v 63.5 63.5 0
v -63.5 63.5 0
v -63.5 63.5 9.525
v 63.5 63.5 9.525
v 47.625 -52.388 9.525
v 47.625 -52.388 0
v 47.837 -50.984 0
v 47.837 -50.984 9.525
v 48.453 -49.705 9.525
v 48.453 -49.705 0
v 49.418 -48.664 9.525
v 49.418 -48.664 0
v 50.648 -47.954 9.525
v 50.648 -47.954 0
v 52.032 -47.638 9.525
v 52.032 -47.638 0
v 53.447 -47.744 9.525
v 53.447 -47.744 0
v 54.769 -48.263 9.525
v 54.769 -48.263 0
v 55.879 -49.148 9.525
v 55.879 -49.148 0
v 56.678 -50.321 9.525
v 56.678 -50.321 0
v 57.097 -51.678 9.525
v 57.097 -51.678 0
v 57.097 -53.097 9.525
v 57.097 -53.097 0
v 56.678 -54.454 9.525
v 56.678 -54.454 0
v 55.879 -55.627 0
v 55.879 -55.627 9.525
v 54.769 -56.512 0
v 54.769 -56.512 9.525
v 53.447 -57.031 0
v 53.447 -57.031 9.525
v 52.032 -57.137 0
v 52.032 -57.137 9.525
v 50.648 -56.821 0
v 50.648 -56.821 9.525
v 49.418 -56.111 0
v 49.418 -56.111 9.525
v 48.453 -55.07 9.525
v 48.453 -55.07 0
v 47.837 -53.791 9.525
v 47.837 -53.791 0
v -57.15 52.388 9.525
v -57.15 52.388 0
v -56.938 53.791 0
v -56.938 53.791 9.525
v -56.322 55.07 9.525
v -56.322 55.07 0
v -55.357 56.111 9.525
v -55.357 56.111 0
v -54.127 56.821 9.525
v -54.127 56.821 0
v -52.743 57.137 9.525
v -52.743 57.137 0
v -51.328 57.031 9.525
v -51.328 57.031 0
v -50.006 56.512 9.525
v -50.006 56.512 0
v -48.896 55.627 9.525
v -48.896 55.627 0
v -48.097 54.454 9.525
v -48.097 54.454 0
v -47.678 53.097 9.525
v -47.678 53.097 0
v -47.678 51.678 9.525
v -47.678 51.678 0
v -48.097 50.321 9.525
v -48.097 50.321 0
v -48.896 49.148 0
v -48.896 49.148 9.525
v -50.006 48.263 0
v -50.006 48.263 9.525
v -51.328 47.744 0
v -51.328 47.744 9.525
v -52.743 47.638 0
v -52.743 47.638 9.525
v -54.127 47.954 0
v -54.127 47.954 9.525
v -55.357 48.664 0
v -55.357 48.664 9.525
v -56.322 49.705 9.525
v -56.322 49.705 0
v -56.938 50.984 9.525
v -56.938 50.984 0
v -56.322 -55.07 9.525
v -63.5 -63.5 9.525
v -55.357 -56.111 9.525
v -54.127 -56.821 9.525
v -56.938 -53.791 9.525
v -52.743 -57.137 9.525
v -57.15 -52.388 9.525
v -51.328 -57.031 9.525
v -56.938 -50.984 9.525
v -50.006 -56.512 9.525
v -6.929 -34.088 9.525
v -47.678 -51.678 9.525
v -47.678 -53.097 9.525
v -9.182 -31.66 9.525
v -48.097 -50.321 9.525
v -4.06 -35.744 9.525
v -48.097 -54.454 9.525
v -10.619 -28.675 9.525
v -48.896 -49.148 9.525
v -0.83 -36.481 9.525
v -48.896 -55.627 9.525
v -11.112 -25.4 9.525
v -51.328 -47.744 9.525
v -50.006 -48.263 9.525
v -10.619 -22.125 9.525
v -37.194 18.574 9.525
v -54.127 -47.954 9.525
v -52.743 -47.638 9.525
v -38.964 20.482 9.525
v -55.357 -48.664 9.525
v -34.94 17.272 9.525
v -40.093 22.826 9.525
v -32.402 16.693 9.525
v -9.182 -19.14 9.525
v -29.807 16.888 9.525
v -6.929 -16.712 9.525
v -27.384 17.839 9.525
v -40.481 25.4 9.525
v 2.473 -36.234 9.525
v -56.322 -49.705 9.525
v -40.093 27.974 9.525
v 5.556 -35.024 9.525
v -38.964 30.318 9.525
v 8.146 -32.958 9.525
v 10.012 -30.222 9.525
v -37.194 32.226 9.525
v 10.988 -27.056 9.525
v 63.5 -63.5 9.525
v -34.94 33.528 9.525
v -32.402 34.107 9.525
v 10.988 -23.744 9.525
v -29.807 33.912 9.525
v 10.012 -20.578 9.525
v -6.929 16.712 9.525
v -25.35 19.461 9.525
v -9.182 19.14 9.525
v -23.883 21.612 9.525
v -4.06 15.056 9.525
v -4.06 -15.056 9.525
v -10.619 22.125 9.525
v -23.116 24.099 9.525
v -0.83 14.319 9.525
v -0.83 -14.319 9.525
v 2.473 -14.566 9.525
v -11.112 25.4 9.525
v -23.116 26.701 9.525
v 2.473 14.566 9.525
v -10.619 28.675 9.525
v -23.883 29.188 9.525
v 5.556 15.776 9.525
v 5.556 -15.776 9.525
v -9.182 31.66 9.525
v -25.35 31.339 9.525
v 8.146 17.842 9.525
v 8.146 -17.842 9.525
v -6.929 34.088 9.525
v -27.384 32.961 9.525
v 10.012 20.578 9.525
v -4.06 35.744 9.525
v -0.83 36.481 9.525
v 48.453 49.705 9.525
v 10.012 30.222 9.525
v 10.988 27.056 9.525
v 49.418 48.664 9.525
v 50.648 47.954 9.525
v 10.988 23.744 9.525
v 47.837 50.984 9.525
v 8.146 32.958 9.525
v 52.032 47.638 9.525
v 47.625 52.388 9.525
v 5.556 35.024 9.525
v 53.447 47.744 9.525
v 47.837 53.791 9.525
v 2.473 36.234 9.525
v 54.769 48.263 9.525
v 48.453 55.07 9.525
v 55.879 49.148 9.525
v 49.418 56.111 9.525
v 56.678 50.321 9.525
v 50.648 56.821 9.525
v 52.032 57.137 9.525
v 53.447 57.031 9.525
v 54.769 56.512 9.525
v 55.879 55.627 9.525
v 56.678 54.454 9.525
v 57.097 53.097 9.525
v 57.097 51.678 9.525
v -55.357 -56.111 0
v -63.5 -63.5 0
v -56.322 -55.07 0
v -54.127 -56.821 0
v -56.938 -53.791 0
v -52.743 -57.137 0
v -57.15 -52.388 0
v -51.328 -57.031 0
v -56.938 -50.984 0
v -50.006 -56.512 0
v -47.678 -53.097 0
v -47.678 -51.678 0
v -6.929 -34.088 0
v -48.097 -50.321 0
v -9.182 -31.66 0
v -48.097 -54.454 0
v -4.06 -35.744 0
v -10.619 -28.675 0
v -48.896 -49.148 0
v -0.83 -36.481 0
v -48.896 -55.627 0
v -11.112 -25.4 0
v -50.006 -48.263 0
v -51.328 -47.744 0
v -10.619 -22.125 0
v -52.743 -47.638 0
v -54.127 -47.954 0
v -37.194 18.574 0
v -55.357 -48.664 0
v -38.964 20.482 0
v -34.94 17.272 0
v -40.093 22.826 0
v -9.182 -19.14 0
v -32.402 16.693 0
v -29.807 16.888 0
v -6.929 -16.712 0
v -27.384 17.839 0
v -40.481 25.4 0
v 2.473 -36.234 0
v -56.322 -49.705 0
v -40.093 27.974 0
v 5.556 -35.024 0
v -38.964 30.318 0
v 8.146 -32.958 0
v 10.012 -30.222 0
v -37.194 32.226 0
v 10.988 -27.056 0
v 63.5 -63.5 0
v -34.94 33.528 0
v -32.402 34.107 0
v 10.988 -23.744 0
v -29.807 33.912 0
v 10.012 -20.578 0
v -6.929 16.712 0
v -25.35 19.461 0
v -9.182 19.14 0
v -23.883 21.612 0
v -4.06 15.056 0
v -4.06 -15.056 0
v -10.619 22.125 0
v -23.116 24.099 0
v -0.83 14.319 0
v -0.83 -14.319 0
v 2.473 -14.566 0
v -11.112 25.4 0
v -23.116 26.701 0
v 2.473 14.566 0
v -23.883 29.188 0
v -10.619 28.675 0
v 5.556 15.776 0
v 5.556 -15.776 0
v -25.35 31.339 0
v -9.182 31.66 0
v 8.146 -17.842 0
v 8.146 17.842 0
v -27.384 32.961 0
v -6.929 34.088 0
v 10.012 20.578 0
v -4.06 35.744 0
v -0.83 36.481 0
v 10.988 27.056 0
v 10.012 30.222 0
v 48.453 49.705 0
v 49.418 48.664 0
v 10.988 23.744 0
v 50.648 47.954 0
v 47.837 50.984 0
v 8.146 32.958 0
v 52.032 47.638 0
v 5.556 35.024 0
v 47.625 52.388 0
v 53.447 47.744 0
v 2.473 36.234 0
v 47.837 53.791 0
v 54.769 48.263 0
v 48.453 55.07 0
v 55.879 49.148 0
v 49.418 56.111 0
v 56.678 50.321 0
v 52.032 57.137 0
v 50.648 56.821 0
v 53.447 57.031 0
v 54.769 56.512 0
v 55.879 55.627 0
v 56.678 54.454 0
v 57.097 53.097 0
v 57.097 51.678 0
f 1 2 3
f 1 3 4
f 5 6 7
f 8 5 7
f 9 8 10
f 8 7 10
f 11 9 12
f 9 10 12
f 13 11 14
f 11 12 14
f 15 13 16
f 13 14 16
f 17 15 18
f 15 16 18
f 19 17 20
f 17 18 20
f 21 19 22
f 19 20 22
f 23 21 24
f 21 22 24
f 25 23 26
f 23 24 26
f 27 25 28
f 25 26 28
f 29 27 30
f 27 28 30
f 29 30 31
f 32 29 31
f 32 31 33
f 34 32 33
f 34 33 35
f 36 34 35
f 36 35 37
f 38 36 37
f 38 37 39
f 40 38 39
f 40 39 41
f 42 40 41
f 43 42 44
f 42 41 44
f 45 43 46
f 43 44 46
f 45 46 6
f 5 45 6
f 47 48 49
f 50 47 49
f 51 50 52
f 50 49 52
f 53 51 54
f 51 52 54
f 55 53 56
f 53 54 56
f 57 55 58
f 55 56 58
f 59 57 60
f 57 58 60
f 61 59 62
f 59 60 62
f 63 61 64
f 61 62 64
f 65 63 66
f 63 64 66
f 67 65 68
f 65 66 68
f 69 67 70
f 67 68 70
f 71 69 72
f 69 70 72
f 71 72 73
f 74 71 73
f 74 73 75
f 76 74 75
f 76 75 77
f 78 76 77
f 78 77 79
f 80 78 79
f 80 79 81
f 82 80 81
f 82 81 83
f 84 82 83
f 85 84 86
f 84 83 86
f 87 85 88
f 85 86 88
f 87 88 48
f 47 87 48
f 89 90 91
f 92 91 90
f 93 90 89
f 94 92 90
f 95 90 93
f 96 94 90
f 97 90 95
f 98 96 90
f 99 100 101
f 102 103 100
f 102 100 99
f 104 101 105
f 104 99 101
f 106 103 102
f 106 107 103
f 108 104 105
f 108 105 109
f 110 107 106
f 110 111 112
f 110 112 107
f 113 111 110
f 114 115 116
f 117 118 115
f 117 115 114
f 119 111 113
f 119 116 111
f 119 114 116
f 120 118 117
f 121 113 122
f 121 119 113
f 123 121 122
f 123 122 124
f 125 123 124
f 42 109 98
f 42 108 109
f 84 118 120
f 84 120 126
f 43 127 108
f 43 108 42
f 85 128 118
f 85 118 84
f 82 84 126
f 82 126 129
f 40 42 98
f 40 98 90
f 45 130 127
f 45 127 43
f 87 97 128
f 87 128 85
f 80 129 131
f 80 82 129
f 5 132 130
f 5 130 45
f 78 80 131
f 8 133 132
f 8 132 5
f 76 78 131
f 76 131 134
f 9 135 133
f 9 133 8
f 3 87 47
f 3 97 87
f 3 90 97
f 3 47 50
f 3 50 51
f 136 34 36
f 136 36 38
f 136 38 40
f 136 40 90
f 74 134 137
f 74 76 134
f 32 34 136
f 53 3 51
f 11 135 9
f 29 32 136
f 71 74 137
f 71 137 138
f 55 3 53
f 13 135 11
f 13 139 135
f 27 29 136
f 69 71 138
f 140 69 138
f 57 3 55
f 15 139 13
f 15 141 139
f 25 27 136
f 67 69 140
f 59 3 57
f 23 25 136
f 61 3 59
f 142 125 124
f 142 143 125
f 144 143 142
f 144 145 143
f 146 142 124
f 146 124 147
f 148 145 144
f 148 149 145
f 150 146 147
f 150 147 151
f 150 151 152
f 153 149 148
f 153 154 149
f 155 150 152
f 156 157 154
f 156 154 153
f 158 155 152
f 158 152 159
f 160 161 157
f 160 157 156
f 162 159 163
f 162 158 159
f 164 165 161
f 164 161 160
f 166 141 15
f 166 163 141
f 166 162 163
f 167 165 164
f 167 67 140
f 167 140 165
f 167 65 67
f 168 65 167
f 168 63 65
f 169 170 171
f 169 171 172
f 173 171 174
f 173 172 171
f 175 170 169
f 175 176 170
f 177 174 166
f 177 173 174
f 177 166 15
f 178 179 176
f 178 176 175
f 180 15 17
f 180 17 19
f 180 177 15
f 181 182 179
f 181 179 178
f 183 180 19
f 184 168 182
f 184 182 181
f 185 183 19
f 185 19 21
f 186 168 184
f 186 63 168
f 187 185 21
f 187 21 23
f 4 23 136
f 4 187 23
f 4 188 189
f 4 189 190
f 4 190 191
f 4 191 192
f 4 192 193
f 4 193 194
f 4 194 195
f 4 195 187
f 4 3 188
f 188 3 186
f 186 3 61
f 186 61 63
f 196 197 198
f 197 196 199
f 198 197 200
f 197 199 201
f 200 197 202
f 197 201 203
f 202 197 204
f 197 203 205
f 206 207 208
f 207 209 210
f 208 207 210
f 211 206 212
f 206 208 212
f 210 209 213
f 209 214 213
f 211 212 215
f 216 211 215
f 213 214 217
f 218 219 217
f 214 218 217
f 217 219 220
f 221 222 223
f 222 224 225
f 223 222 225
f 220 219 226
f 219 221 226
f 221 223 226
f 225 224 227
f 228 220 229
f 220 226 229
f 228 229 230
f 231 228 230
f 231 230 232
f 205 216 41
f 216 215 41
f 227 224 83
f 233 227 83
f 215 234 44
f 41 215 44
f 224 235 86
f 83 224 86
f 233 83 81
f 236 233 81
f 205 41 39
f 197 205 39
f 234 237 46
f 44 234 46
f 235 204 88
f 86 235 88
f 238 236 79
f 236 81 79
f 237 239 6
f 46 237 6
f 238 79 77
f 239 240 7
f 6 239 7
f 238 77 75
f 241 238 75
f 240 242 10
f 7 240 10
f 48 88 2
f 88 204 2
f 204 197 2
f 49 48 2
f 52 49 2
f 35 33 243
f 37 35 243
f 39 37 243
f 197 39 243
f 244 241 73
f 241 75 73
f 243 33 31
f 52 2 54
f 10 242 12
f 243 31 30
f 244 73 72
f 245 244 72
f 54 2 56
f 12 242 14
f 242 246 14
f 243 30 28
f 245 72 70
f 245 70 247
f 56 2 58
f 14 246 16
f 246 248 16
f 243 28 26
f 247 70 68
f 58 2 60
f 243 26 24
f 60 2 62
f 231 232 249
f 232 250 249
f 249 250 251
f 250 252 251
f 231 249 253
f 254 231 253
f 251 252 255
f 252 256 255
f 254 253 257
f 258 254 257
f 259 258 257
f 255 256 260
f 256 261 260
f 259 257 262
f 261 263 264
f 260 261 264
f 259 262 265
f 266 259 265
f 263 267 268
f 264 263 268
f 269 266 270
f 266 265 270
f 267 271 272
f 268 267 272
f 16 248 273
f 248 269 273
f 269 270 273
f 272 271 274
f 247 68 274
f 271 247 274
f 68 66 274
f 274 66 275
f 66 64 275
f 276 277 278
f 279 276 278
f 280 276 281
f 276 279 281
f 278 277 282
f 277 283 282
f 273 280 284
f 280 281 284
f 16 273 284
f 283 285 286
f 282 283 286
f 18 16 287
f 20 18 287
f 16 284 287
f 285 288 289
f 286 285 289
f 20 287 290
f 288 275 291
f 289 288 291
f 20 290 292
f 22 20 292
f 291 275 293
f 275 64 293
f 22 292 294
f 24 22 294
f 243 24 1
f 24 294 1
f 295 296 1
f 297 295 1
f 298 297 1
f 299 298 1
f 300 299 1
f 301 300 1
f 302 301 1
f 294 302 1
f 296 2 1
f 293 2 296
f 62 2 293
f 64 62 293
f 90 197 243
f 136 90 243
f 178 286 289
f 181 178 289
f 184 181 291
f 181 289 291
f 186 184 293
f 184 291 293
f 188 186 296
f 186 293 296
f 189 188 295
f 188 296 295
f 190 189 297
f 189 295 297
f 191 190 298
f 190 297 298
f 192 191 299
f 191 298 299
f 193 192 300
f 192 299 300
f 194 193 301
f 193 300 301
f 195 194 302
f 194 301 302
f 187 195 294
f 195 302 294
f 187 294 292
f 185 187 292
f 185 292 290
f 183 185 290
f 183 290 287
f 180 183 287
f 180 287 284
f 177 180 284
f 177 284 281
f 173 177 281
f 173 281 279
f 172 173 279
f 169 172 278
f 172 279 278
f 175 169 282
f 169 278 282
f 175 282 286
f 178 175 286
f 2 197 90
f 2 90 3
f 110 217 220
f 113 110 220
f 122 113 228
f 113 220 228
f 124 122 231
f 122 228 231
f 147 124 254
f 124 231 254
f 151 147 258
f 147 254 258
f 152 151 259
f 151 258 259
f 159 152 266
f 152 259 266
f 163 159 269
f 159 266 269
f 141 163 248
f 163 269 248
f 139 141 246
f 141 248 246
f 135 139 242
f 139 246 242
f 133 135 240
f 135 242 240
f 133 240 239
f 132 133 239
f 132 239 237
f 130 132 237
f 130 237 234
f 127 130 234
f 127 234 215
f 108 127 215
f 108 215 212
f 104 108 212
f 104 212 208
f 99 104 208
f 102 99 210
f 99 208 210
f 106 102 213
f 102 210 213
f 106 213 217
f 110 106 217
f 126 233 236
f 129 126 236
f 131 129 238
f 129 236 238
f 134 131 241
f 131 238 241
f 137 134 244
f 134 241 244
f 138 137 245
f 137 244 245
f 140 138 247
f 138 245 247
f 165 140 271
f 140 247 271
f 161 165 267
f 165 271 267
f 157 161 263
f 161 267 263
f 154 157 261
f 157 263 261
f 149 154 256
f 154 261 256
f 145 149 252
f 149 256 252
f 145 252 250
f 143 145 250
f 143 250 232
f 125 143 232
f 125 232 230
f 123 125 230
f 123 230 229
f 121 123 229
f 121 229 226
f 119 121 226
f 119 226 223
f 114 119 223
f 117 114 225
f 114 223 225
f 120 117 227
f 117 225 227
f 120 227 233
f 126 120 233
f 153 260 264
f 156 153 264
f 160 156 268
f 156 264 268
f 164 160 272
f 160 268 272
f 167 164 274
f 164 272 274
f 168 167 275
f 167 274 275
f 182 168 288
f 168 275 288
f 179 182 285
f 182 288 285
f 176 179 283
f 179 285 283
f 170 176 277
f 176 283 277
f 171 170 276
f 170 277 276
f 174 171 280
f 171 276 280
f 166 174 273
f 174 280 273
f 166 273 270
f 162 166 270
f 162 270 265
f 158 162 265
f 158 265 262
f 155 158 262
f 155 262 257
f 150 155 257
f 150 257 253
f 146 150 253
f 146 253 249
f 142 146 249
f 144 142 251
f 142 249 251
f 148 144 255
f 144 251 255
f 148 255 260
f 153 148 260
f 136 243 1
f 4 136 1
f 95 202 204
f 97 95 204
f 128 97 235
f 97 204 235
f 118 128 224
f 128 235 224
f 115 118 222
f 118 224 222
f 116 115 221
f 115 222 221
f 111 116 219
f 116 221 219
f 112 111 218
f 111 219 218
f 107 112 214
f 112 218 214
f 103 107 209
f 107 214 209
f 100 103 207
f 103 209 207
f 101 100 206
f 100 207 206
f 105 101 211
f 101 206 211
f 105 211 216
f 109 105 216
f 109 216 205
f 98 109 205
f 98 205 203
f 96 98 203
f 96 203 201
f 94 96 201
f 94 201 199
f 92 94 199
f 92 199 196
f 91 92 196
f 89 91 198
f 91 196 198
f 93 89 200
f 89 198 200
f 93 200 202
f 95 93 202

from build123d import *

# Parameters (mm, degrees)
SKETCH1_W           = 127
SKETCH1_H           = 127
BOSS_EXTRUDE1_DEPTH = 9.525
SKETCH2_R           = 11.1125
SKETCH2_R_2         = 8.73125
CUT_EXTRUDE1_DEPTH  = 9.525
SKETCH3_R           = 4.7625
CUT_EXTRUDE2_DEPTH  = 9.525


with BuildPart() as part:
    # Sketch1 → Boss-Extrude1 (new body)
    with BuildSketch(Plane.XY):
        Rectangle(SKETCH1_W, SKETCH1_H)
    extrude(amount=BOSS_EXTRUDE1_DEPTH)

    # Sketch2 → Cut-Extrude1 (cut)
    with BuildSketch(Plane(origin=(0, 0, 0), x_dir=(-1, 0, 0), z_dir=(0, 0, -1))):
        with Locations((0, 25.4)):
            Circle(SKETCH2_R)
        with Locations((31.75, 25.4)):
            Circle(SKETCH2_R_2)
        with Locations((0, -25.4)):
            Circle(SKETCH2_R)
    extrude(amount=-CUT_EXTRUDE1_DEPTH, mode=Mode.SUBTRACT)

    # Sketch3 → Cut-Extrude2 (cut)
    with BuildSketch(Plane(origin=(0, 0, 0), x_dir=(-1, 0, 0), z_dir=(0, 0, -1))):
        with Locations((52.3875, 52.3875)):
            Circle(SKETCH3_R)
        with Locations((52.3875, -52.3875)):
            Circle(SKETCH3_R)
        with Locations((-52.3875, 52.3875)):
            Circle(SKETCH3_R)
        with Locations((-52.3875, -52.3875)):
            Circle(SKETCH3_R)
    extrude(amount=-CUT_EXTRUDE2_DEPTH, mode=Mode.SUBTRACT)


solid = part.part
